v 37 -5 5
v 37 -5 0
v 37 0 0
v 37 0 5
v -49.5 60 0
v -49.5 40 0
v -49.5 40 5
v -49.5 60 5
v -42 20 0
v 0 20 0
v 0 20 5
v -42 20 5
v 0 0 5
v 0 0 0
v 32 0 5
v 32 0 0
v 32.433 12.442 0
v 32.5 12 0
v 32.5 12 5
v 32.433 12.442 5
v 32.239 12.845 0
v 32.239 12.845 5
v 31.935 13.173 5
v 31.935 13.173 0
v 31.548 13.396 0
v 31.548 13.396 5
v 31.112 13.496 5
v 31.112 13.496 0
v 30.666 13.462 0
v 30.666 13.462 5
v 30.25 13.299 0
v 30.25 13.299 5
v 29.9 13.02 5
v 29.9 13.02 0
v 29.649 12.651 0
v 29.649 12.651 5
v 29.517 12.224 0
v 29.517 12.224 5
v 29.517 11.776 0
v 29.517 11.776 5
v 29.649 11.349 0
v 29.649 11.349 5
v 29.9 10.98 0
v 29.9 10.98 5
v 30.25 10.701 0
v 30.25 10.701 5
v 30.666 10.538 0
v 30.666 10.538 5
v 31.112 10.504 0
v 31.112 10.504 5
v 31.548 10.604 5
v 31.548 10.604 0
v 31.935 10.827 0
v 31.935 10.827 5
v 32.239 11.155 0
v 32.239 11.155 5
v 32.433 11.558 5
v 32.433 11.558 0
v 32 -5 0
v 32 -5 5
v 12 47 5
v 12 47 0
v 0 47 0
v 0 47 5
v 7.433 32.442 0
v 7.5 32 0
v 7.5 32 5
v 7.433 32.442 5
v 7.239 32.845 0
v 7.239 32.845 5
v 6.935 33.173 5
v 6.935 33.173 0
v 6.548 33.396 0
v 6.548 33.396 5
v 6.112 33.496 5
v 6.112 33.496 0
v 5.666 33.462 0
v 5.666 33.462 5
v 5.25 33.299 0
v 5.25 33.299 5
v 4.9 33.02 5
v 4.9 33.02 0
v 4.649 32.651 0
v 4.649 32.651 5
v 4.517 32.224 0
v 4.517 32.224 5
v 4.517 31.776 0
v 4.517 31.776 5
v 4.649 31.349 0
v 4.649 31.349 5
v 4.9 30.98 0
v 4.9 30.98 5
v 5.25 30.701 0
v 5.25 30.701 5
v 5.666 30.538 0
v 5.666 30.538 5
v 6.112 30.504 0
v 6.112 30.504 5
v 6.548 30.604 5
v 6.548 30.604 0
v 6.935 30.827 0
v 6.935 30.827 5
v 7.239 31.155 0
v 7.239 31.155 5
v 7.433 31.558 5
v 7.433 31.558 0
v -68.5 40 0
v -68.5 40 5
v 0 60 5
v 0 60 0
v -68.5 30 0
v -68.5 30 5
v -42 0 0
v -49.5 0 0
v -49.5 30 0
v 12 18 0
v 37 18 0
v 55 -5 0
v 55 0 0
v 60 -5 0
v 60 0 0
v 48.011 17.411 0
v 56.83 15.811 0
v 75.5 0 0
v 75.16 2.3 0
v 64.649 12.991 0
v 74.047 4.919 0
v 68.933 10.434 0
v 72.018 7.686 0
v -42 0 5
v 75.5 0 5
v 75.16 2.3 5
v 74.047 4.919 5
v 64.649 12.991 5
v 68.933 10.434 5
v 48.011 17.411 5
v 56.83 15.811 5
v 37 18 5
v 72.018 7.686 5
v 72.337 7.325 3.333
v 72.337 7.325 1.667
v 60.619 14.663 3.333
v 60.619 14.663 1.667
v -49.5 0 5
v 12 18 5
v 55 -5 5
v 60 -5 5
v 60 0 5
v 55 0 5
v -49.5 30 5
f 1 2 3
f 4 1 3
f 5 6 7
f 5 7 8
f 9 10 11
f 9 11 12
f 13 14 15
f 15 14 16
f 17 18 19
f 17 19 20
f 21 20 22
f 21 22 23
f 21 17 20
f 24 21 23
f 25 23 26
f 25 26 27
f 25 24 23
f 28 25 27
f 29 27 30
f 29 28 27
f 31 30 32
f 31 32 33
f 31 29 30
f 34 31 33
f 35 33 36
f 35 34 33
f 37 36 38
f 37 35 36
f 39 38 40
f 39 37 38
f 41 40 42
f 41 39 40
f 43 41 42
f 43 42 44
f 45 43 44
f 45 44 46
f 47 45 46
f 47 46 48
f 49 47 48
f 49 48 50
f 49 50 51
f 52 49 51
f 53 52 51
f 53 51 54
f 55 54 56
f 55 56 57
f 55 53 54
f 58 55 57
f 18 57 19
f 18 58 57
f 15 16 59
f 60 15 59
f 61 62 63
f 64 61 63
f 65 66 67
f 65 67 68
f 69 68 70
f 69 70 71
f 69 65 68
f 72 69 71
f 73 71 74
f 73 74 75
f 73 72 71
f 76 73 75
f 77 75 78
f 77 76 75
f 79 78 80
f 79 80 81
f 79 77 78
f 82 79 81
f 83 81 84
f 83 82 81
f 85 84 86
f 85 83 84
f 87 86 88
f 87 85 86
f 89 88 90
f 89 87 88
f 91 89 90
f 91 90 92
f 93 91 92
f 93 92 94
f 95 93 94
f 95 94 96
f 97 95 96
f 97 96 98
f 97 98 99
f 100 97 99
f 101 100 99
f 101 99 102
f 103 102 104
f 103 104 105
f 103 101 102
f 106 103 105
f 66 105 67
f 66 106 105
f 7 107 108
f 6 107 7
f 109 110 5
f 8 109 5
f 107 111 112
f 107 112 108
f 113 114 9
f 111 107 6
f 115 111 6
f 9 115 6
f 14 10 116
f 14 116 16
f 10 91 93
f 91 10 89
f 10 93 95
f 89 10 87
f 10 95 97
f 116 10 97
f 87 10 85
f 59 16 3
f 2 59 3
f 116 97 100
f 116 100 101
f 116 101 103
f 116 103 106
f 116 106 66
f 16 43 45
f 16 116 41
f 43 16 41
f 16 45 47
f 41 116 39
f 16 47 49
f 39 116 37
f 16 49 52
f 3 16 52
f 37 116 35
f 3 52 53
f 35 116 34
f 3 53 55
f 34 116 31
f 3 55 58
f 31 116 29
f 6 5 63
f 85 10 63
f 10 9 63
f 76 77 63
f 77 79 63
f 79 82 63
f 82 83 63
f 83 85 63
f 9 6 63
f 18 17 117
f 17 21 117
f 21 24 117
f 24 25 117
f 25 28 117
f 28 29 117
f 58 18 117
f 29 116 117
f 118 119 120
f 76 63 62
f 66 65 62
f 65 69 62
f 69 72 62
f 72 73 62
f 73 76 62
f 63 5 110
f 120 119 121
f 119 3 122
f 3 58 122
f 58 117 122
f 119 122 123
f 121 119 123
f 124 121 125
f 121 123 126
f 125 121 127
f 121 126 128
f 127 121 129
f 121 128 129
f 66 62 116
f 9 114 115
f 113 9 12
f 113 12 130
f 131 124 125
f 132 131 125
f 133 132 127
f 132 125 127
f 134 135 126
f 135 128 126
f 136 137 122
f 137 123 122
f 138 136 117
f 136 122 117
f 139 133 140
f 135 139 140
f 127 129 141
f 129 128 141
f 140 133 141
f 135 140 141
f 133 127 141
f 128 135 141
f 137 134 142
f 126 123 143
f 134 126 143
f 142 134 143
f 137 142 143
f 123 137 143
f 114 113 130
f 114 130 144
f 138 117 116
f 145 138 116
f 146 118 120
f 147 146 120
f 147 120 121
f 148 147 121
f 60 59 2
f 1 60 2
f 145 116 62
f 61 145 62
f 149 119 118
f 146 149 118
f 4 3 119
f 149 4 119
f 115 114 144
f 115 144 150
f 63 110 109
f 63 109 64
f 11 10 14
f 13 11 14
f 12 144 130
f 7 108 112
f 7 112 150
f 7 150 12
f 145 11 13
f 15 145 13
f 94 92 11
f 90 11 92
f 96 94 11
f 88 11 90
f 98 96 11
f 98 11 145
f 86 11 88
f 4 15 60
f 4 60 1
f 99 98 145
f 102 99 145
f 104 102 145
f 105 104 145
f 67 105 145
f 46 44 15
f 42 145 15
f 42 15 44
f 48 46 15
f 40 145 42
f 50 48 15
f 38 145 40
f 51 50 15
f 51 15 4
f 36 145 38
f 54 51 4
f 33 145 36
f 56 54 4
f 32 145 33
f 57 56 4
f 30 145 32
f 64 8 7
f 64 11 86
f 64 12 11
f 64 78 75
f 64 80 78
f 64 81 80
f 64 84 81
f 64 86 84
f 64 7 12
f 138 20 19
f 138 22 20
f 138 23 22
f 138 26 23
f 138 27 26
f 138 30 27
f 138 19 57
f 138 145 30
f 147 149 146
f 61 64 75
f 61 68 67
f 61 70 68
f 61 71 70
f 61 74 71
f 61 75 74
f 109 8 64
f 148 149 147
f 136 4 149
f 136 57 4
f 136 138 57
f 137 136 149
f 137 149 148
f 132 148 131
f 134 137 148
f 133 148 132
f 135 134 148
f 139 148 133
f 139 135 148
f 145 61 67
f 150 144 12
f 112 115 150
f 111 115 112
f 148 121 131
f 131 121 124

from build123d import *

# Parameters (mm, degrees)
ESQUISSE1_R             = 1.5
BOSS_EXTRU_1_DEPTH      = 5
BOSS_EXTRU_2_DEPTH      = 5
ESQUISSE3_W             = 236.288260714
ESQUISSE3_H             = 122.224262112
ENL_V_MAT_EXTRU_1_DEPTH = 5


with BuildPart() as part:
    # Esquisse1 → Boss.-Extru.1 (new body)
    with BuildSketch(Plane.XY):
        Polygon((0, 0), (32, 0), (32, -5), (37, -5), (37, 0), (37, 18), (12, 18), (12, 47), (0, 47), align=None)
        with Locations((6, 32)):
            Circle(ESQUISSE1_R, mode=Mode.SUBTRACT)
        with Locations((31, 12)):
            Circle(ESQUISSE1_R, mode=Mode.SUBTRACT)
    extrude(amount=BOSS_EXTRU_1_DEPTH)

    # Esquisse2 → Boss.-Extru.2 (add)
    with BuildSketch(Plane(origin=(0, 0, 0), x_dir=(-1, 0, 0), z_dir=(0, 0, -1))):
        with BuildLine():
            Line((-37, 0), (-55, 0))
            Line((-55, 0), (-55, -5))
            Line((-55, -5), (-60, -5))
            Line((-60, -5), (-60, 0))
            Line((-60, 0), (-75.5, 0))
            add(Edge.make_bspline(
                [(-75.5, 0), (-75.5, 5.982232529), (-67.685409636, 18), (-37, 18)],
                knots=[0, 0, 0, 0, 1, 1, 1, 1], degree=3))
            Line((-37, 18), (-37, 0))
        make_face()
        Polygon((42, 0), (49.5, 0), (49.5, 30), (68.5, 30), (68.5, 40), (49.5, 40), (49.5, 110), (68.5, 110), (68.5, 120), (49.5, 120), (49.5, 142), (-1, 142), (-1, 167), (-10, 167), (-10, 172), (-20, 172), (-20, 167), (-25, 167), (-25, 90), (20, 90), (20, 60), (0, 60), (0, 20), (42, 20), align=None)
    extrude(amount=-BOSS_EXTRU_2_DEPTH)

    # Esquisse3 → Enlèv. mat.-Extru.1 (cut)
    with BuildSketch(Plane(origin=(0, 0, 0), x_dir=(-1, 0, 0), z_dir=(0, 0, -1))):
        with Locations((68.98963671, 121.112131056)):
            Rectangle(ESQUISSE3_W, ESQUISSE3_H)
    extrude(amount=-ENL_V_MAT_EXTRU_1_DEPTH, mode=Mode.SUBTRACT)


solid = part.part
